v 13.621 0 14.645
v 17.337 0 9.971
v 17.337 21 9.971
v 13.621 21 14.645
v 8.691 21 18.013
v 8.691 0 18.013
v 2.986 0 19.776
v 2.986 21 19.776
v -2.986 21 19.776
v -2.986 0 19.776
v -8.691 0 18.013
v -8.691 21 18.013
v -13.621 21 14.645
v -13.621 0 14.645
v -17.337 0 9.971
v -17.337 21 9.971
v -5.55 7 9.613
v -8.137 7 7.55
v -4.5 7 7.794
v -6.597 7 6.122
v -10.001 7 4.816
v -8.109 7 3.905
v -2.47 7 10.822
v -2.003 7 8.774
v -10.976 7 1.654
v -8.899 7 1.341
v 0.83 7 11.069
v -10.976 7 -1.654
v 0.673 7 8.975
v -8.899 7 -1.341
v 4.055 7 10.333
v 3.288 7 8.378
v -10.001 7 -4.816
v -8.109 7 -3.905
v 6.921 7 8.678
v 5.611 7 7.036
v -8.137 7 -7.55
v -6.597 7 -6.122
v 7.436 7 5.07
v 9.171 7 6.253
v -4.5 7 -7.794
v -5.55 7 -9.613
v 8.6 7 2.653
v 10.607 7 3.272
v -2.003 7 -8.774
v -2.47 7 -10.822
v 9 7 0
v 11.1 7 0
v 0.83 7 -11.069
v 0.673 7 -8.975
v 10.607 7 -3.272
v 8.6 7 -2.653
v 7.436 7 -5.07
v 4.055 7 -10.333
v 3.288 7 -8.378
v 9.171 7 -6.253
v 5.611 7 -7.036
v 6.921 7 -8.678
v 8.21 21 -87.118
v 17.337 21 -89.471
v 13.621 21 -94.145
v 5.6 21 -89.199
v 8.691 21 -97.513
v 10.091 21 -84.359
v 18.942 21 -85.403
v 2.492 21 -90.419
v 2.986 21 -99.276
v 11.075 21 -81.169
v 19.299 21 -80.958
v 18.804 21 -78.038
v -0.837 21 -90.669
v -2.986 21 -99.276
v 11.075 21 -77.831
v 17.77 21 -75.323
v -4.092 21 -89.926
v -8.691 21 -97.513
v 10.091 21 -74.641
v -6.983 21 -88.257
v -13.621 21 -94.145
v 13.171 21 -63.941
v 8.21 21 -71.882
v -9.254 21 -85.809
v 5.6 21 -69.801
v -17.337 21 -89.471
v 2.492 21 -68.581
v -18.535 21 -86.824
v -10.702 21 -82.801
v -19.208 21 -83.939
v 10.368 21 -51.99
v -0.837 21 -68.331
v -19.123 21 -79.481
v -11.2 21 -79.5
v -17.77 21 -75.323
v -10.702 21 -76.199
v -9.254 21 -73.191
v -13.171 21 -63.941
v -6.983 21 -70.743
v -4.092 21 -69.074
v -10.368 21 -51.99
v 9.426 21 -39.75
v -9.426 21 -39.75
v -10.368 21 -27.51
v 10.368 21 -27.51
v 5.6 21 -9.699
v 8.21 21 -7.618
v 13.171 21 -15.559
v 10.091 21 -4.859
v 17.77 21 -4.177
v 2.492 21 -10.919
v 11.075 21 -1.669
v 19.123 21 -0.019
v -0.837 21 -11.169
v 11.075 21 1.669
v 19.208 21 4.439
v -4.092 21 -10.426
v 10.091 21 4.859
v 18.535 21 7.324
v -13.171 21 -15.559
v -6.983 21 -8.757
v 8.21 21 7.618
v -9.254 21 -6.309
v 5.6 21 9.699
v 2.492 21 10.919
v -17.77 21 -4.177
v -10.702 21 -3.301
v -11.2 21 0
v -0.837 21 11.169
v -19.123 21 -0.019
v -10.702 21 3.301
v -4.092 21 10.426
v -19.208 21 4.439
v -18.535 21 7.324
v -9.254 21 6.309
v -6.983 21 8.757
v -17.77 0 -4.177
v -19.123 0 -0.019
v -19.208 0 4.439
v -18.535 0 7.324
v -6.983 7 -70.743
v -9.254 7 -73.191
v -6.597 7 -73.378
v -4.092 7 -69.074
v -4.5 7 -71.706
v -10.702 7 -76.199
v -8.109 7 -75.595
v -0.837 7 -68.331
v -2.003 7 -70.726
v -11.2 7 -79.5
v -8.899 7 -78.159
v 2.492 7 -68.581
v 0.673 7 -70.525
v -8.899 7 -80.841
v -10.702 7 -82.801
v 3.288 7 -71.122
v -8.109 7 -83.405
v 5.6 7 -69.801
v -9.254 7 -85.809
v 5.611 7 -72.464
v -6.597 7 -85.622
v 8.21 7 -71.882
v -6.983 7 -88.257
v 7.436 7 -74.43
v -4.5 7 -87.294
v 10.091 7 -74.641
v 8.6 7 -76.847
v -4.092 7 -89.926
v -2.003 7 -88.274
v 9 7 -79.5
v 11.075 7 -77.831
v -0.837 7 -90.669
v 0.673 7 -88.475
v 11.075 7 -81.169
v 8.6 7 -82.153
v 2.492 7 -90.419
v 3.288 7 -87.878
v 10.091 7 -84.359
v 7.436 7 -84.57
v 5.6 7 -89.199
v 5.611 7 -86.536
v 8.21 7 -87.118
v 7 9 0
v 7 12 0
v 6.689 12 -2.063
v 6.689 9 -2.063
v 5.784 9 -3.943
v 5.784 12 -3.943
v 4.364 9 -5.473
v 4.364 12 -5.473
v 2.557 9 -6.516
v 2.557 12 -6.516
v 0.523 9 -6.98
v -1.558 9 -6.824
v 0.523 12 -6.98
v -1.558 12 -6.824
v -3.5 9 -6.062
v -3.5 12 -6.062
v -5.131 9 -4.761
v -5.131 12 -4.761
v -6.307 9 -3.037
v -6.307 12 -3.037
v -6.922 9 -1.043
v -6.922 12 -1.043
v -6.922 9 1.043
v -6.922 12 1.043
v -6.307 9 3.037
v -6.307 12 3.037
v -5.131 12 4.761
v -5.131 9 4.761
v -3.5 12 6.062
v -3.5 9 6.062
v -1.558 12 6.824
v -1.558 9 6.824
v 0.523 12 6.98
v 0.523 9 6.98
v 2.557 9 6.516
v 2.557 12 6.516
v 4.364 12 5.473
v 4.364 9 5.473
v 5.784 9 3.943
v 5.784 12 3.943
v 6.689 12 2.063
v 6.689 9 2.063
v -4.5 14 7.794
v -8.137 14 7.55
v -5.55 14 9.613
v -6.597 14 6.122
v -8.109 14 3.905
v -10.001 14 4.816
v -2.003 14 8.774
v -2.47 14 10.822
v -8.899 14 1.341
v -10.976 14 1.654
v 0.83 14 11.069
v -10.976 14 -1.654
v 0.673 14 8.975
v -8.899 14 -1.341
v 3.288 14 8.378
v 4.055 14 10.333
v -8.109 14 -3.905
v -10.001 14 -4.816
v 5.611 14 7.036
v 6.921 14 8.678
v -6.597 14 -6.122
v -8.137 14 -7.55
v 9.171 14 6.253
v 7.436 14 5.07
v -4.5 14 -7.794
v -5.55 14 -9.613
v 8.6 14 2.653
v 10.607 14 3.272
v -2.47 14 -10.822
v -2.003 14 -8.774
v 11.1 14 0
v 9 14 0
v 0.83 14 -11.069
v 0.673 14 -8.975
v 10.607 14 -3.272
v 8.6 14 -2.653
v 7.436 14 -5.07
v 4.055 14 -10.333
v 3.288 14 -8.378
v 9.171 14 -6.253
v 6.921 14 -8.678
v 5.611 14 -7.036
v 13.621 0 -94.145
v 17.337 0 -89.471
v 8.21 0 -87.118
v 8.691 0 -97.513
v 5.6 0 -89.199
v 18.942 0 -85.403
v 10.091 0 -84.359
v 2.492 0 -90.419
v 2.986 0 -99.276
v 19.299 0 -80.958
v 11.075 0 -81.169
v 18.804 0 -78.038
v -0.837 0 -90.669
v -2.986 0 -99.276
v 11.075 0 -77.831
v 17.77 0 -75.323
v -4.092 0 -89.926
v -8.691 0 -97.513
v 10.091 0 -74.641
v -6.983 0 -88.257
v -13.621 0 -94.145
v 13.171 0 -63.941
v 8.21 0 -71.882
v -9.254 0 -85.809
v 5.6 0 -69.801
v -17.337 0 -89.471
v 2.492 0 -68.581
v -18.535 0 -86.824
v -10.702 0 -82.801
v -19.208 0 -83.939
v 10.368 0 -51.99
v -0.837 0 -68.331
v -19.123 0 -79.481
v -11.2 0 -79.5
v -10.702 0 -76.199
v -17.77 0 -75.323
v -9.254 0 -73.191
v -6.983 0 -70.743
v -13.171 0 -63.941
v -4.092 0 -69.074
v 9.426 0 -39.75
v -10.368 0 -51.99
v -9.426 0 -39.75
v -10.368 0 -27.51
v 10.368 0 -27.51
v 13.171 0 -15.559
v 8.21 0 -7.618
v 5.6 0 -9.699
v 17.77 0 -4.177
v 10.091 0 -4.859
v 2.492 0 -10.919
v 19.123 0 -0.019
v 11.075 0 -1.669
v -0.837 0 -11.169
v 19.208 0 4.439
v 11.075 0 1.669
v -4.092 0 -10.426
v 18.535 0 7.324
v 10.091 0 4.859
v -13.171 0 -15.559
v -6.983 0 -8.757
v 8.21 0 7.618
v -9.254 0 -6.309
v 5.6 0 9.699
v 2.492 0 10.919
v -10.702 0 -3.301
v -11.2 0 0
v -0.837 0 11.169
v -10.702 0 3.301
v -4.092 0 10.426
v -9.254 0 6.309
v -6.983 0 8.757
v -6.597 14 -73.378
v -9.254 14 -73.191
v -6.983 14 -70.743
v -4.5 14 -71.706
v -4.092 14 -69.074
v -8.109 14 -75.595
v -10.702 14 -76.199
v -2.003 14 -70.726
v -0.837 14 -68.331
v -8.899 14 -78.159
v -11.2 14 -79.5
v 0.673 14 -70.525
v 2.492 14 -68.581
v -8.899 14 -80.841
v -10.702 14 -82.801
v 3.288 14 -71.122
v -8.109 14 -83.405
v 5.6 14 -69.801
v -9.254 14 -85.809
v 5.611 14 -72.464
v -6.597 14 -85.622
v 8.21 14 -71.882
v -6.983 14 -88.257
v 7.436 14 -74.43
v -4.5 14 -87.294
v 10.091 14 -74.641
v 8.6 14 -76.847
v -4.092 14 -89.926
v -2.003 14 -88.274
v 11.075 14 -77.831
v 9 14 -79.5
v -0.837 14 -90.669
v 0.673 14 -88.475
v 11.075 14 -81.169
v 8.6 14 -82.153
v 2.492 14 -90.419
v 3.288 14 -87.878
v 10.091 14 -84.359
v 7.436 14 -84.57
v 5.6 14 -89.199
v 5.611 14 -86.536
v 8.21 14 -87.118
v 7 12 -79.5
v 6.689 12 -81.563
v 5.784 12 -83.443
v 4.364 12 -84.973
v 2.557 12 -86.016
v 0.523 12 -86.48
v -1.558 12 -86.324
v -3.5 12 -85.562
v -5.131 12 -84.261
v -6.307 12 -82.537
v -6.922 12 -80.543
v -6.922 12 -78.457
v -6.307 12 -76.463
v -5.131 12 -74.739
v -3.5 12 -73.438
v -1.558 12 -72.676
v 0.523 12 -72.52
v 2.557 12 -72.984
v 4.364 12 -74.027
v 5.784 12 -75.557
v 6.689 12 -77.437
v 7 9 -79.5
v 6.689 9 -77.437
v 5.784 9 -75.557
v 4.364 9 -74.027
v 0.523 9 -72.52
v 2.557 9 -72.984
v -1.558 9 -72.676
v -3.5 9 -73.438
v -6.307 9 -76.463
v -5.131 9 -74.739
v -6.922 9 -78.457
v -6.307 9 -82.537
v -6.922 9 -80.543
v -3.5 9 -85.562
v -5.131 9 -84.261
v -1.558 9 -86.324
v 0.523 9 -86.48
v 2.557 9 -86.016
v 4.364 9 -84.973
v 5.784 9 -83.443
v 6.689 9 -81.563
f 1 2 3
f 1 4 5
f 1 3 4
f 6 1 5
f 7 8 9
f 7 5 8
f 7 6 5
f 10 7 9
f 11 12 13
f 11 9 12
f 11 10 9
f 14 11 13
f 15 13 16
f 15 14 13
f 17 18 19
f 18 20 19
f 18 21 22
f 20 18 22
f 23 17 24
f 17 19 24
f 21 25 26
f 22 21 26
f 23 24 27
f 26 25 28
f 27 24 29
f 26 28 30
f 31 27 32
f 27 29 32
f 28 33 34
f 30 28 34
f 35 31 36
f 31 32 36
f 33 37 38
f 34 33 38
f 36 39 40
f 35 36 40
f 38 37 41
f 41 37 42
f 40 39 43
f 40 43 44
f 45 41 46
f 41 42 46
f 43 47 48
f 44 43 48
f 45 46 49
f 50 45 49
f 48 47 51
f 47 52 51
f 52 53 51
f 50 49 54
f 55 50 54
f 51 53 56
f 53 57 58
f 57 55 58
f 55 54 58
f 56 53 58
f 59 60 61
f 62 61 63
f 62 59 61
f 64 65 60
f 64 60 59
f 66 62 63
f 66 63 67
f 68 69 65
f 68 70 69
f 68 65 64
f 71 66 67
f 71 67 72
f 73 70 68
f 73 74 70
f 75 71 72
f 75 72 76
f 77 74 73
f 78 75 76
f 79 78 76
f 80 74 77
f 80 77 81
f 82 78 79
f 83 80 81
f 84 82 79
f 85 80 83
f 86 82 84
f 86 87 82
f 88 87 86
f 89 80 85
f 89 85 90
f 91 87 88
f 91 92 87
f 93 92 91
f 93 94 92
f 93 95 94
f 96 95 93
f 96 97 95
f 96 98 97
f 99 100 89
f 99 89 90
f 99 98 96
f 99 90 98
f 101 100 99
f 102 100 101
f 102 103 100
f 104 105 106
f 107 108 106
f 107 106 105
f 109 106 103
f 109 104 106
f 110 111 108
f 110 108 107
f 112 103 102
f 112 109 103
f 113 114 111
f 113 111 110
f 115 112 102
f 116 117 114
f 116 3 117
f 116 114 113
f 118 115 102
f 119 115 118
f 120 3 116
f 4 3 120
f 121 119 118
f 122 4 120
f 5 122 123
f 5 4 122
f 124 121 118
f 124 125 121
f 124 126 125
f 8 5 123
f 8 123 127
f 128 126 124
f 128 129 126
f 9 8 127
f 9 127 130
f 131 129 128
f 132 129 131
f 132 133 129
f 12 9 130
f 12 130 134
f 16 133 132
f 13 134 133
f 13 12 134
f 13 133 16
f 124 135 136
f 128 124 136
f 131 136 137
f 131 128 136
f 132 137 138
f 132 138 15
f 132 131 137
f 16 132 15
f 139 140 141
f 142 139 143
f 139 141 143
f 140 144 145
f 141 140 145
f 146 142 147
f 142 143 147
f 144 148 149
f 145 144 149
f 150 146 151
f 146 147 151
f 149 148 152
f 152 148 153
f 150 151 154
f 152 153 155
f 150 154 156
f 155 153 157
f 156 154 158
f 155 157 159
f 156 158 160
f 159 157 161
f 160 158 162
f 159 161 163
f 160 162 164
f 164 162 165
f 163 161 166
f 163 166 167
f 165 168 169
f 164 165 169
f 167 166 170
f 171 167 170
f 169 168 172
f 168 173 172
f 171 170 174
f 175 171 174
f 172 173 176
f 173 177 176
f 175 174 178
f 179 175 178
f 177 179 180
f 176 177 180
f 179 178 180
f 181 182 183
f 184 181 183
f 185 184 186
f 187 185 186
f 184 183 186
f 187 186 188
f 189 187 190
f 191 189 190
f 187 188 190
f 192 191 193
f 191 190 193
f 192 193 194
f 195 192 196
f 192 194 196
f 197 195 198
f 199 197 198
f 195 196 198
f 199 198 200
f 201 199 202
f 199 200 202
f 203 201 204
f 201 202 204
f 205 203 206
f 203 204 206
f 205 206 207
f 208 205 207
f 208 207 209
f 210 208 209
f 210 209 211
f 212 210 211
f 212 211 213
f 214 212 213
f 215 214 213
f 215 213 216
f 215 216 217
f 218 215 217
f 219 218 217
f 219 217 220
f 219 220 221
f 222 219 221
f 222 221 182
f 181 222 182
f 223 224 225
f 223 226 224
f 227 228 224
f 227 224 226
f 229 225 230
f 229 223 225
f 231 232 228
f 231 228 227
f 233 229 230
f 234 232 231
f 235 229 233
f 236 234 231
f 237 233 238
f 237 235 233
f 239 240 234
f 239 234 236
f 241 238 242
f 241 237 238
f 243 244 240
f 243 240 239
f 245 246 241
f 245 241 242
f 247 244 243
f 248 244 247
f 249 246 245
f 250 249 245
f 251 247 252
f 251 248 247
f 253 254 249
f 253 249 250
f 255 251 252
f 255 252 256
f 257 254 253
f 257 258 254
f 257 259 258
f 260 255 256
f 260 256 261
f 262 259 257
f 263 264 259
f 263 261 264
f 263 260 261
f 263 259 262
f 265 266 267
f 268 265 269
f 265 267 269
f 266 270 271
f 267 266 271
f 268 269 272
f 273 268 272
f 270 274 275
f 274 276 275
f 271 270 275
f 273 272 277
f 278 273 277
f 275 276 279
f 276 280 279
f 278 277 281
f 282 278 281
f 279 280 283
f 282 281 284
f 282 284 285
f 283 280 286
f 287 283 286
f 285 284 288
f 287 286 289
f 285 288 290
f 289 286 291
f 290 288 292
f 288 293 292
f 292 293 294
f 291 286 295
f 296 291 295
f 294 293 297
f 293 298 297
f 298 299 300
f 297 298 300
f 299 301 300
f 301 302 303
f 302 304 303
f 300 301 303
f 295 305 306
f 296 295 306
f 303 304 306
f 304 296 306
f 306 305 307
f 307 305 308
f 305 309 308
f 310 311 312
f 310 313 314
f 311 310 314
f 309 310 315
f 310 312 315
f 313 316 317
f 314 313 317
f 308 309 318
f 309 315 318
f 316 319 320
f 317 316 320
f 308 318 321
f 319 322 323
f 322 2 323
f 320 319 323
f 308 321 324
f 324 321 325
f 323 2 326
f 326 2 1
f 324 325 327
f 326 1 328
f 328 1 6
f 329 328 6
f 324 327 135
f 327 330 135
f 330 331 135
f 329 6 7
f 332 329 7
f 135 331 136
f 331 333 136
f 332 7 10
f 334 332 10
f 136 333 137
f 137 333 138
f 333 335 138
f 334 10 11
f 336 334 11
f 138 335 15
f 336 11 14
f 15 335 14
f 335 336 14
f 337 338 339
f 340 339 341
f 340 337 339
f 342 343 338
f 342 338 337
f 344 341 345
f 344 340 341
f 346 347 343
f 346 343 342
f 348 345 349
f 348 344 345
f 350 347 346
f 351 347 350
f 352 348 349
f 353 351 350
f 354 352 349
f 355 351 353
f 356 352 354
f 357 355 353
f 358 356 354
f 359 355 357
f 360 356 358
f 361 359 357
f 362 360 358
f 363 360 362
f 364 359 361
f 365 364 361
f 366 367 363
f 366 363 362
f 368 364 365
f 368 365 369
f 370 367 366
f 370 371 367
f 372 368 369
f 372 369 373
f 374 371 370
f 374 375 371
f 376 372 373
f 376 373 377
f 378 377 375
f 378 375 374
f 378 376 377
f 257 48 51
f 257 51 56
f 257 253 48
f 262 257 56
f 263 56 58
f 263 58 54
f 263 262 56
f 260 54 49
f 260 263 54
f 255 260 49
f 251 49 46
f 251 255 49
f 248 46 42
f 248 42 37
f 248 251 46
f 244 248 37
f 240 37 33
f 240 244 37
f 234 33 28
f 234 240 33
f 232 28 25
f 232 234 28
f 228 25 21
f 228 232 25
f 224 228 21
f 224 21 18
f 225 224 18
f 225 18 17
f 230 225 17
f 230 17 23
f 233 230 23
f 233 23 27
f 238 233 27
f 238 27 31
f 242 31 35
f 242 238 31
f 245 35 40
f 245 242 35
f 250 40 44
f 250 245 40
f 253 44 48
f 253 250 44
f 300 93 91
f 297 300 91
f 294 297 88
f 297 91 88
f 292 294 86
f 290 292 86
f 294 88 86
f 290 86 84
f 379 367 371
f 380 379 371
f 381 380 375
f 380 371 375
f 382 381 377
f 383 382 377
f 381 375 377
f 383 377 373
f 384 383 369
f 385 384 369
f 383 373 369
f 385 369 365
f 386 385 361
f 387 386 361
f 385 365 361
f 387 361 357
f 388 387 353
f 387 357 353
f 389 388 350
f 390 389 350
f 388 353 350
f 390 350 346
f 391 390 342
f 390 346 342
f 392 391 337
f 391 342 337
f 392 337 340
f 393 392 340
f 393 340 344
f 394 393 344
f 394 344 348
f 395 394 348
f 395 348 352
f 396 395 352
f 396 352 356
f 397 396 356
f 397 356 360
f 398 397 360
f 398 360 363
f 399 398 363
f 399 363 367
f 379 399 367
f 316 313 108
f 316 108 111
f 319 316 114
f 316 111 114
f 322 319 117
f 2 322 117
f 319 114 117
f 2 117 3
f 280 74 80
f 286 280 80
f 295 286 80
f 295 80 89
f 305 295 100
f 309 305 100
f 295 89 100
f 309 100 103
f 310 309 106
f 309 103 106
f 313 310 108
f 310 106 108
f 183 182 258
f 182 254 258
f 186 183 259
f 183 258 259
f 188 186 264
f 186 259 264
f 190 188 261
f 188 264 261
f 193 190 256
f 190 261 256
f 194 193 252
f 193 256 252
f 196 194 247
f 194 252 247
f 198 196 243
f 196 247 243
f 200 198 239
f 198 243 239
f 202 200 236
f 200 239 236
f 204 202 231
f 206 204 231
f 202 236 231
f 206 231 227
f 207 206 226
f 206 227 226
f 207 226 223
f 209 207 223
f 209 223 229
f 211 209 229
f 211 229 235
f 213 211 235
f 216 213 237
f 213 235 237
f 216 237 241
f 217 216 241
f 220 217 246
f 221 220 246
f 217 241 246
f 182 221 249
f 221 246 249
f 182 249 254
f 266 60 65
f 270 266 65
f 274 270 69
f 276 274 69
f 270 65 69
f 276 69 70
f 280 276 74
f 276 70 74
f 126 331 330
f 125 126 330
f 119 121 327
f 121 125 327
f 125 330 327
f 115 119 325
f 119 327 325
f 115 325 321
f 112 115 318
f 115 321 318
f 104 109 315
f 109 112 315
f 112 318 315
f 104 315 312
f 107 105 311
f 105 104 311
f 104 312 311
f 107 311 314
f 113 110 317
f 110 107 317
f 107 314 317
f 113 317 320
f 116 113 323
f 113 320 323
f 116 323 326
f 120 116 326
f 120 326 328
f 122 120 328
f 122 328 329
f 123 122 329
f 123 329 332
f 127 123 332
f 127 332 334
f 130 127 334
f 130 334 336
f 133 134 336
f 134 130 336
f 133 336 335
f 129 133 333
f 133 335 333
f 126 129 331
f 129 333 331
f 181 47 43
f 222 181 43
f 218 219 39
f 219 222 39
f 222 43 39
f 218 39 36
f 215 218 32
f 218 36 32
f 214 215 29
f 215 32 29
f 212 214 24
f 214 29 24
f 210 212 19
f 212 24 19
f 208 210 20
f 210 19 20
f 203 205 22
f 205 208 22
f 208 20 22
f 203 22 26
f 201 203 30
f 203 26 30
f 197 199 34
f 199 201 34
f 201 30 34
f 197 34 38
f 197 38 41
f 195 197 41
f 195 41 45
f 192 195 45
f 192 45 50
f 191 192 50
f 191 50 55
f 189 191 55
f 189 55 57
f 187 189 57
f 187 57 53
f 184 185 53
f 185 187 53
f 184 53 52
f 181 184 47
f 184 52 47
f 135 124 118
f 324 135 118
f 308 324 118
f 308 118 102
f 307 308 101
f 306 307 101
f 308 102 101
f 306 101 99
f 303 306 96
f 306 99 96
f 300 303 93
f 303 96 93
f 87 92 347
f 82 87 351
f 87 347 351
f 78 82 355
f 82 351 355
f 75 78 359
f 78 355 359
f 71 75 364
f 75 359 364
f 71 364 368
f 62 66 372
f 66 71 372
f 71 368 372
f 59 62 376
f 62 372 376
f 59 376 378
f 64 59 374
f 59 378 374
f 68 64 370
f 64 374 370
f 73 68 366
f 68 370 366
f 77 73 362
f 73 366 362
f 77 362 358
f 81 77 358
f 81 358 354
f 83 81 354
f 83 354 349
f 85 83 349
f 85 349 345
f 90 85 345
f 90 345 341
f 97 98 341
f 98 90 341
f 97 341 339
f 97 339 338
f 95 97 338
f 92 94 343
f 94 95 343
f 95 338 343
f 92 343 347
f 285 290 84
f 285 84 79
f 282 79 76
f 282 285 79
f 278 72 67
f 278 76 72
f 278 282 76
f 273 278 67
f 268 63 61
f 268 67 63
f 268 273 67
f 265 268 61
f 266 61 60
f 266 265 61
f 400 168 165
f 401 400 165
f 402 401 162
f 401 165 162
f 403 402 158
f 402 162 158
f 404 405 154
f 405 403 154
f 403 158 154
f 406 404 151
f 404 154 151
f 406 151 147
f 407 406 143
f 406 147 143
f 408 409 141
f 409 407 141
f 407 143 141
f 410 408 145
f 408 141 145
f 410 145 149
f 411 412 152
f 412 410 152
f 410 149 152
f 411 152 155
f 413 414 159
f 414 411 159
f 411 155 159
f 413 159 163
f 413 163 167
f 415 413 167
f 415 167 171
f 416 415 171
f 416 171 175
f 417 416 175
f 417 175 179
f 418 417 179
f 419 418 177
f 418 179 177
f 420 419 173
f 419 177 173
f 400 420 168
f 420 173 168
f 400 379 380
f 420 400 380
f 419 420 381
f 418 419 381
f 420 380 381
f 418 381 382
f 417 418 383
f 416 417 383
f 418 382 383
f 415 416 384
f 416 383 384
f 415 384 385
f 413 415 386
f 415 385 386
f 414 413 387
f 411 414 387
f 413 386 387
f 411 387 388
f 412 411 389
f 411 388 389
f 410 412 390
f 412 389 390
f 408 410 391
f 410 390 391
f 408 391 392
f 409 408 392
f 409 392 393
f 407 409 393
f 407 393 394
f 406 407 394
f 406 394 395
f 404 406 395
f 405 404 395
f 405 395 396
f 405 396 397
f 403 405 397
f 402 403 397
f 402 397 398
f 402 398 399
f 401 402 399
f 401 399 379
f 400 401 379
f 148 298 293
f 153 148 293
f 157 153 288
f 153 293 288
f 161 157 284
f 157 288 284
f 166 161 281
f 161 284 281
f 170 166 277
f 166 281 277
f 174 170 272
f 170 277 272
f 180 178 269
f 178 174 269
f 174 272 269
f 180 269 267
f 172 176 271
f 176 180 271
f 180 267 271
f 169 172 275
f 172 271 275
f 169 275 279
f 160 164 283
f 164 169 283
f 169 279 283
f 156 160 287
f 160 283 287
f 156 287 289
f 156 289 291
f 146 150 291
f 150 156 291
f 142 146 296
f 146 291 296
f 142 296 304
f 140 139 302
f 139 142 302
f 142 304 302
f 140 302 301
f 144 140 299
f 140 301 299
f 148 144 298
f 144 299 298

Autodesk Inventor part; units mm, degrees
ref_plane "YZ Plane" through (0, 0, 0) normal (1, 0, 0) x (0, 1, 0)
ref_plane "XZ Plane" through (0, 0, 0) normal (0, 1, 0) x (-1, 0, 0)
sketch "Sketch1" plane through (0, 0, 0) normal (0, 1, 0) x (-1, 0, 0)
  circle A0 centre (0, 0) radius 11.2
  circle A1 centre (0, -79.5) radius 11.2
  circle A2 centre (0, 0) radius 20
  circle A3 centre (0, -79.5) radius 20
  line L0 (20, 0) -> (20, -79.5)
  line L1 (-20, 0) -> (-20, -79.5)
  dimension "d0" = 22.4
  dimension "d1" = 22.4
  dimension "d2" = 0
  dimension "d3" = 79.5
  dimension "d4" = 40
  dimension "d5" = 40
extrude "Extrusion1" add sketch "Sketch1" along normal blind 21
ref_plane "Work Plane1" through (0, 14, 0) normal (0, 1, 0) x (1, 0, 0)
sketch "Sketch2" plane through (0, 14, 0) normal (0, 1, 0) x (1, 0, 0)
  circle A0 centre (0, 0) radius 7
  circle A1 centre (0, 79.5) radius 11.2 projected
  circle A2 centre (0, 79.5) radius 7
  circle A3 centre (0, 0) radius 11.1
  dimension "d9" = 14
  dimension "d10" = 14
extrude "Extrusion2" add sketch "Sketch2" against normal blind 7
chamfer "Chamfer1" distance 2 angle 45 4 edges at (-7, 14, 0) (-7, 14, -79.5) (-7, 7, -79.5) (-7, 7, 0)
sketch "Sketch3" plane through (0, 21, 0) normal (0, 1, 0) x (1, 0, 0)
  line L0 (-20, 79.5) -> (-20, 0) projected
  arc A0 (20, 79.5) -> (-20, 79.5) centre (0, 79.5) ccw projected
  arc A1 (-20, 0) -> (-20, 79.5) centre (-89.4258, 39.75) ccw
  line L1 (20, 0) -> (20, 79.5) projected
  arc A2 (20, 79.5) -> (20, 0) centre (89.4258, 39.75) ccw
  point P0 (0, 0)
  dimension "d16" = 80
  dimension "d17" = 80
extrude "Extrusion3" cut sketch "Sketch3" against normal blind 80
fillet "Fillet1" radius 15 4 edges at (20, 10.5, 0) (20, 10.5, -79.5) (-20, 10.5, -79.5) (-20, 10.5, 0)
equation "\"d18\" = d16"
properties part number "Distancia_Cojinetes_2"
